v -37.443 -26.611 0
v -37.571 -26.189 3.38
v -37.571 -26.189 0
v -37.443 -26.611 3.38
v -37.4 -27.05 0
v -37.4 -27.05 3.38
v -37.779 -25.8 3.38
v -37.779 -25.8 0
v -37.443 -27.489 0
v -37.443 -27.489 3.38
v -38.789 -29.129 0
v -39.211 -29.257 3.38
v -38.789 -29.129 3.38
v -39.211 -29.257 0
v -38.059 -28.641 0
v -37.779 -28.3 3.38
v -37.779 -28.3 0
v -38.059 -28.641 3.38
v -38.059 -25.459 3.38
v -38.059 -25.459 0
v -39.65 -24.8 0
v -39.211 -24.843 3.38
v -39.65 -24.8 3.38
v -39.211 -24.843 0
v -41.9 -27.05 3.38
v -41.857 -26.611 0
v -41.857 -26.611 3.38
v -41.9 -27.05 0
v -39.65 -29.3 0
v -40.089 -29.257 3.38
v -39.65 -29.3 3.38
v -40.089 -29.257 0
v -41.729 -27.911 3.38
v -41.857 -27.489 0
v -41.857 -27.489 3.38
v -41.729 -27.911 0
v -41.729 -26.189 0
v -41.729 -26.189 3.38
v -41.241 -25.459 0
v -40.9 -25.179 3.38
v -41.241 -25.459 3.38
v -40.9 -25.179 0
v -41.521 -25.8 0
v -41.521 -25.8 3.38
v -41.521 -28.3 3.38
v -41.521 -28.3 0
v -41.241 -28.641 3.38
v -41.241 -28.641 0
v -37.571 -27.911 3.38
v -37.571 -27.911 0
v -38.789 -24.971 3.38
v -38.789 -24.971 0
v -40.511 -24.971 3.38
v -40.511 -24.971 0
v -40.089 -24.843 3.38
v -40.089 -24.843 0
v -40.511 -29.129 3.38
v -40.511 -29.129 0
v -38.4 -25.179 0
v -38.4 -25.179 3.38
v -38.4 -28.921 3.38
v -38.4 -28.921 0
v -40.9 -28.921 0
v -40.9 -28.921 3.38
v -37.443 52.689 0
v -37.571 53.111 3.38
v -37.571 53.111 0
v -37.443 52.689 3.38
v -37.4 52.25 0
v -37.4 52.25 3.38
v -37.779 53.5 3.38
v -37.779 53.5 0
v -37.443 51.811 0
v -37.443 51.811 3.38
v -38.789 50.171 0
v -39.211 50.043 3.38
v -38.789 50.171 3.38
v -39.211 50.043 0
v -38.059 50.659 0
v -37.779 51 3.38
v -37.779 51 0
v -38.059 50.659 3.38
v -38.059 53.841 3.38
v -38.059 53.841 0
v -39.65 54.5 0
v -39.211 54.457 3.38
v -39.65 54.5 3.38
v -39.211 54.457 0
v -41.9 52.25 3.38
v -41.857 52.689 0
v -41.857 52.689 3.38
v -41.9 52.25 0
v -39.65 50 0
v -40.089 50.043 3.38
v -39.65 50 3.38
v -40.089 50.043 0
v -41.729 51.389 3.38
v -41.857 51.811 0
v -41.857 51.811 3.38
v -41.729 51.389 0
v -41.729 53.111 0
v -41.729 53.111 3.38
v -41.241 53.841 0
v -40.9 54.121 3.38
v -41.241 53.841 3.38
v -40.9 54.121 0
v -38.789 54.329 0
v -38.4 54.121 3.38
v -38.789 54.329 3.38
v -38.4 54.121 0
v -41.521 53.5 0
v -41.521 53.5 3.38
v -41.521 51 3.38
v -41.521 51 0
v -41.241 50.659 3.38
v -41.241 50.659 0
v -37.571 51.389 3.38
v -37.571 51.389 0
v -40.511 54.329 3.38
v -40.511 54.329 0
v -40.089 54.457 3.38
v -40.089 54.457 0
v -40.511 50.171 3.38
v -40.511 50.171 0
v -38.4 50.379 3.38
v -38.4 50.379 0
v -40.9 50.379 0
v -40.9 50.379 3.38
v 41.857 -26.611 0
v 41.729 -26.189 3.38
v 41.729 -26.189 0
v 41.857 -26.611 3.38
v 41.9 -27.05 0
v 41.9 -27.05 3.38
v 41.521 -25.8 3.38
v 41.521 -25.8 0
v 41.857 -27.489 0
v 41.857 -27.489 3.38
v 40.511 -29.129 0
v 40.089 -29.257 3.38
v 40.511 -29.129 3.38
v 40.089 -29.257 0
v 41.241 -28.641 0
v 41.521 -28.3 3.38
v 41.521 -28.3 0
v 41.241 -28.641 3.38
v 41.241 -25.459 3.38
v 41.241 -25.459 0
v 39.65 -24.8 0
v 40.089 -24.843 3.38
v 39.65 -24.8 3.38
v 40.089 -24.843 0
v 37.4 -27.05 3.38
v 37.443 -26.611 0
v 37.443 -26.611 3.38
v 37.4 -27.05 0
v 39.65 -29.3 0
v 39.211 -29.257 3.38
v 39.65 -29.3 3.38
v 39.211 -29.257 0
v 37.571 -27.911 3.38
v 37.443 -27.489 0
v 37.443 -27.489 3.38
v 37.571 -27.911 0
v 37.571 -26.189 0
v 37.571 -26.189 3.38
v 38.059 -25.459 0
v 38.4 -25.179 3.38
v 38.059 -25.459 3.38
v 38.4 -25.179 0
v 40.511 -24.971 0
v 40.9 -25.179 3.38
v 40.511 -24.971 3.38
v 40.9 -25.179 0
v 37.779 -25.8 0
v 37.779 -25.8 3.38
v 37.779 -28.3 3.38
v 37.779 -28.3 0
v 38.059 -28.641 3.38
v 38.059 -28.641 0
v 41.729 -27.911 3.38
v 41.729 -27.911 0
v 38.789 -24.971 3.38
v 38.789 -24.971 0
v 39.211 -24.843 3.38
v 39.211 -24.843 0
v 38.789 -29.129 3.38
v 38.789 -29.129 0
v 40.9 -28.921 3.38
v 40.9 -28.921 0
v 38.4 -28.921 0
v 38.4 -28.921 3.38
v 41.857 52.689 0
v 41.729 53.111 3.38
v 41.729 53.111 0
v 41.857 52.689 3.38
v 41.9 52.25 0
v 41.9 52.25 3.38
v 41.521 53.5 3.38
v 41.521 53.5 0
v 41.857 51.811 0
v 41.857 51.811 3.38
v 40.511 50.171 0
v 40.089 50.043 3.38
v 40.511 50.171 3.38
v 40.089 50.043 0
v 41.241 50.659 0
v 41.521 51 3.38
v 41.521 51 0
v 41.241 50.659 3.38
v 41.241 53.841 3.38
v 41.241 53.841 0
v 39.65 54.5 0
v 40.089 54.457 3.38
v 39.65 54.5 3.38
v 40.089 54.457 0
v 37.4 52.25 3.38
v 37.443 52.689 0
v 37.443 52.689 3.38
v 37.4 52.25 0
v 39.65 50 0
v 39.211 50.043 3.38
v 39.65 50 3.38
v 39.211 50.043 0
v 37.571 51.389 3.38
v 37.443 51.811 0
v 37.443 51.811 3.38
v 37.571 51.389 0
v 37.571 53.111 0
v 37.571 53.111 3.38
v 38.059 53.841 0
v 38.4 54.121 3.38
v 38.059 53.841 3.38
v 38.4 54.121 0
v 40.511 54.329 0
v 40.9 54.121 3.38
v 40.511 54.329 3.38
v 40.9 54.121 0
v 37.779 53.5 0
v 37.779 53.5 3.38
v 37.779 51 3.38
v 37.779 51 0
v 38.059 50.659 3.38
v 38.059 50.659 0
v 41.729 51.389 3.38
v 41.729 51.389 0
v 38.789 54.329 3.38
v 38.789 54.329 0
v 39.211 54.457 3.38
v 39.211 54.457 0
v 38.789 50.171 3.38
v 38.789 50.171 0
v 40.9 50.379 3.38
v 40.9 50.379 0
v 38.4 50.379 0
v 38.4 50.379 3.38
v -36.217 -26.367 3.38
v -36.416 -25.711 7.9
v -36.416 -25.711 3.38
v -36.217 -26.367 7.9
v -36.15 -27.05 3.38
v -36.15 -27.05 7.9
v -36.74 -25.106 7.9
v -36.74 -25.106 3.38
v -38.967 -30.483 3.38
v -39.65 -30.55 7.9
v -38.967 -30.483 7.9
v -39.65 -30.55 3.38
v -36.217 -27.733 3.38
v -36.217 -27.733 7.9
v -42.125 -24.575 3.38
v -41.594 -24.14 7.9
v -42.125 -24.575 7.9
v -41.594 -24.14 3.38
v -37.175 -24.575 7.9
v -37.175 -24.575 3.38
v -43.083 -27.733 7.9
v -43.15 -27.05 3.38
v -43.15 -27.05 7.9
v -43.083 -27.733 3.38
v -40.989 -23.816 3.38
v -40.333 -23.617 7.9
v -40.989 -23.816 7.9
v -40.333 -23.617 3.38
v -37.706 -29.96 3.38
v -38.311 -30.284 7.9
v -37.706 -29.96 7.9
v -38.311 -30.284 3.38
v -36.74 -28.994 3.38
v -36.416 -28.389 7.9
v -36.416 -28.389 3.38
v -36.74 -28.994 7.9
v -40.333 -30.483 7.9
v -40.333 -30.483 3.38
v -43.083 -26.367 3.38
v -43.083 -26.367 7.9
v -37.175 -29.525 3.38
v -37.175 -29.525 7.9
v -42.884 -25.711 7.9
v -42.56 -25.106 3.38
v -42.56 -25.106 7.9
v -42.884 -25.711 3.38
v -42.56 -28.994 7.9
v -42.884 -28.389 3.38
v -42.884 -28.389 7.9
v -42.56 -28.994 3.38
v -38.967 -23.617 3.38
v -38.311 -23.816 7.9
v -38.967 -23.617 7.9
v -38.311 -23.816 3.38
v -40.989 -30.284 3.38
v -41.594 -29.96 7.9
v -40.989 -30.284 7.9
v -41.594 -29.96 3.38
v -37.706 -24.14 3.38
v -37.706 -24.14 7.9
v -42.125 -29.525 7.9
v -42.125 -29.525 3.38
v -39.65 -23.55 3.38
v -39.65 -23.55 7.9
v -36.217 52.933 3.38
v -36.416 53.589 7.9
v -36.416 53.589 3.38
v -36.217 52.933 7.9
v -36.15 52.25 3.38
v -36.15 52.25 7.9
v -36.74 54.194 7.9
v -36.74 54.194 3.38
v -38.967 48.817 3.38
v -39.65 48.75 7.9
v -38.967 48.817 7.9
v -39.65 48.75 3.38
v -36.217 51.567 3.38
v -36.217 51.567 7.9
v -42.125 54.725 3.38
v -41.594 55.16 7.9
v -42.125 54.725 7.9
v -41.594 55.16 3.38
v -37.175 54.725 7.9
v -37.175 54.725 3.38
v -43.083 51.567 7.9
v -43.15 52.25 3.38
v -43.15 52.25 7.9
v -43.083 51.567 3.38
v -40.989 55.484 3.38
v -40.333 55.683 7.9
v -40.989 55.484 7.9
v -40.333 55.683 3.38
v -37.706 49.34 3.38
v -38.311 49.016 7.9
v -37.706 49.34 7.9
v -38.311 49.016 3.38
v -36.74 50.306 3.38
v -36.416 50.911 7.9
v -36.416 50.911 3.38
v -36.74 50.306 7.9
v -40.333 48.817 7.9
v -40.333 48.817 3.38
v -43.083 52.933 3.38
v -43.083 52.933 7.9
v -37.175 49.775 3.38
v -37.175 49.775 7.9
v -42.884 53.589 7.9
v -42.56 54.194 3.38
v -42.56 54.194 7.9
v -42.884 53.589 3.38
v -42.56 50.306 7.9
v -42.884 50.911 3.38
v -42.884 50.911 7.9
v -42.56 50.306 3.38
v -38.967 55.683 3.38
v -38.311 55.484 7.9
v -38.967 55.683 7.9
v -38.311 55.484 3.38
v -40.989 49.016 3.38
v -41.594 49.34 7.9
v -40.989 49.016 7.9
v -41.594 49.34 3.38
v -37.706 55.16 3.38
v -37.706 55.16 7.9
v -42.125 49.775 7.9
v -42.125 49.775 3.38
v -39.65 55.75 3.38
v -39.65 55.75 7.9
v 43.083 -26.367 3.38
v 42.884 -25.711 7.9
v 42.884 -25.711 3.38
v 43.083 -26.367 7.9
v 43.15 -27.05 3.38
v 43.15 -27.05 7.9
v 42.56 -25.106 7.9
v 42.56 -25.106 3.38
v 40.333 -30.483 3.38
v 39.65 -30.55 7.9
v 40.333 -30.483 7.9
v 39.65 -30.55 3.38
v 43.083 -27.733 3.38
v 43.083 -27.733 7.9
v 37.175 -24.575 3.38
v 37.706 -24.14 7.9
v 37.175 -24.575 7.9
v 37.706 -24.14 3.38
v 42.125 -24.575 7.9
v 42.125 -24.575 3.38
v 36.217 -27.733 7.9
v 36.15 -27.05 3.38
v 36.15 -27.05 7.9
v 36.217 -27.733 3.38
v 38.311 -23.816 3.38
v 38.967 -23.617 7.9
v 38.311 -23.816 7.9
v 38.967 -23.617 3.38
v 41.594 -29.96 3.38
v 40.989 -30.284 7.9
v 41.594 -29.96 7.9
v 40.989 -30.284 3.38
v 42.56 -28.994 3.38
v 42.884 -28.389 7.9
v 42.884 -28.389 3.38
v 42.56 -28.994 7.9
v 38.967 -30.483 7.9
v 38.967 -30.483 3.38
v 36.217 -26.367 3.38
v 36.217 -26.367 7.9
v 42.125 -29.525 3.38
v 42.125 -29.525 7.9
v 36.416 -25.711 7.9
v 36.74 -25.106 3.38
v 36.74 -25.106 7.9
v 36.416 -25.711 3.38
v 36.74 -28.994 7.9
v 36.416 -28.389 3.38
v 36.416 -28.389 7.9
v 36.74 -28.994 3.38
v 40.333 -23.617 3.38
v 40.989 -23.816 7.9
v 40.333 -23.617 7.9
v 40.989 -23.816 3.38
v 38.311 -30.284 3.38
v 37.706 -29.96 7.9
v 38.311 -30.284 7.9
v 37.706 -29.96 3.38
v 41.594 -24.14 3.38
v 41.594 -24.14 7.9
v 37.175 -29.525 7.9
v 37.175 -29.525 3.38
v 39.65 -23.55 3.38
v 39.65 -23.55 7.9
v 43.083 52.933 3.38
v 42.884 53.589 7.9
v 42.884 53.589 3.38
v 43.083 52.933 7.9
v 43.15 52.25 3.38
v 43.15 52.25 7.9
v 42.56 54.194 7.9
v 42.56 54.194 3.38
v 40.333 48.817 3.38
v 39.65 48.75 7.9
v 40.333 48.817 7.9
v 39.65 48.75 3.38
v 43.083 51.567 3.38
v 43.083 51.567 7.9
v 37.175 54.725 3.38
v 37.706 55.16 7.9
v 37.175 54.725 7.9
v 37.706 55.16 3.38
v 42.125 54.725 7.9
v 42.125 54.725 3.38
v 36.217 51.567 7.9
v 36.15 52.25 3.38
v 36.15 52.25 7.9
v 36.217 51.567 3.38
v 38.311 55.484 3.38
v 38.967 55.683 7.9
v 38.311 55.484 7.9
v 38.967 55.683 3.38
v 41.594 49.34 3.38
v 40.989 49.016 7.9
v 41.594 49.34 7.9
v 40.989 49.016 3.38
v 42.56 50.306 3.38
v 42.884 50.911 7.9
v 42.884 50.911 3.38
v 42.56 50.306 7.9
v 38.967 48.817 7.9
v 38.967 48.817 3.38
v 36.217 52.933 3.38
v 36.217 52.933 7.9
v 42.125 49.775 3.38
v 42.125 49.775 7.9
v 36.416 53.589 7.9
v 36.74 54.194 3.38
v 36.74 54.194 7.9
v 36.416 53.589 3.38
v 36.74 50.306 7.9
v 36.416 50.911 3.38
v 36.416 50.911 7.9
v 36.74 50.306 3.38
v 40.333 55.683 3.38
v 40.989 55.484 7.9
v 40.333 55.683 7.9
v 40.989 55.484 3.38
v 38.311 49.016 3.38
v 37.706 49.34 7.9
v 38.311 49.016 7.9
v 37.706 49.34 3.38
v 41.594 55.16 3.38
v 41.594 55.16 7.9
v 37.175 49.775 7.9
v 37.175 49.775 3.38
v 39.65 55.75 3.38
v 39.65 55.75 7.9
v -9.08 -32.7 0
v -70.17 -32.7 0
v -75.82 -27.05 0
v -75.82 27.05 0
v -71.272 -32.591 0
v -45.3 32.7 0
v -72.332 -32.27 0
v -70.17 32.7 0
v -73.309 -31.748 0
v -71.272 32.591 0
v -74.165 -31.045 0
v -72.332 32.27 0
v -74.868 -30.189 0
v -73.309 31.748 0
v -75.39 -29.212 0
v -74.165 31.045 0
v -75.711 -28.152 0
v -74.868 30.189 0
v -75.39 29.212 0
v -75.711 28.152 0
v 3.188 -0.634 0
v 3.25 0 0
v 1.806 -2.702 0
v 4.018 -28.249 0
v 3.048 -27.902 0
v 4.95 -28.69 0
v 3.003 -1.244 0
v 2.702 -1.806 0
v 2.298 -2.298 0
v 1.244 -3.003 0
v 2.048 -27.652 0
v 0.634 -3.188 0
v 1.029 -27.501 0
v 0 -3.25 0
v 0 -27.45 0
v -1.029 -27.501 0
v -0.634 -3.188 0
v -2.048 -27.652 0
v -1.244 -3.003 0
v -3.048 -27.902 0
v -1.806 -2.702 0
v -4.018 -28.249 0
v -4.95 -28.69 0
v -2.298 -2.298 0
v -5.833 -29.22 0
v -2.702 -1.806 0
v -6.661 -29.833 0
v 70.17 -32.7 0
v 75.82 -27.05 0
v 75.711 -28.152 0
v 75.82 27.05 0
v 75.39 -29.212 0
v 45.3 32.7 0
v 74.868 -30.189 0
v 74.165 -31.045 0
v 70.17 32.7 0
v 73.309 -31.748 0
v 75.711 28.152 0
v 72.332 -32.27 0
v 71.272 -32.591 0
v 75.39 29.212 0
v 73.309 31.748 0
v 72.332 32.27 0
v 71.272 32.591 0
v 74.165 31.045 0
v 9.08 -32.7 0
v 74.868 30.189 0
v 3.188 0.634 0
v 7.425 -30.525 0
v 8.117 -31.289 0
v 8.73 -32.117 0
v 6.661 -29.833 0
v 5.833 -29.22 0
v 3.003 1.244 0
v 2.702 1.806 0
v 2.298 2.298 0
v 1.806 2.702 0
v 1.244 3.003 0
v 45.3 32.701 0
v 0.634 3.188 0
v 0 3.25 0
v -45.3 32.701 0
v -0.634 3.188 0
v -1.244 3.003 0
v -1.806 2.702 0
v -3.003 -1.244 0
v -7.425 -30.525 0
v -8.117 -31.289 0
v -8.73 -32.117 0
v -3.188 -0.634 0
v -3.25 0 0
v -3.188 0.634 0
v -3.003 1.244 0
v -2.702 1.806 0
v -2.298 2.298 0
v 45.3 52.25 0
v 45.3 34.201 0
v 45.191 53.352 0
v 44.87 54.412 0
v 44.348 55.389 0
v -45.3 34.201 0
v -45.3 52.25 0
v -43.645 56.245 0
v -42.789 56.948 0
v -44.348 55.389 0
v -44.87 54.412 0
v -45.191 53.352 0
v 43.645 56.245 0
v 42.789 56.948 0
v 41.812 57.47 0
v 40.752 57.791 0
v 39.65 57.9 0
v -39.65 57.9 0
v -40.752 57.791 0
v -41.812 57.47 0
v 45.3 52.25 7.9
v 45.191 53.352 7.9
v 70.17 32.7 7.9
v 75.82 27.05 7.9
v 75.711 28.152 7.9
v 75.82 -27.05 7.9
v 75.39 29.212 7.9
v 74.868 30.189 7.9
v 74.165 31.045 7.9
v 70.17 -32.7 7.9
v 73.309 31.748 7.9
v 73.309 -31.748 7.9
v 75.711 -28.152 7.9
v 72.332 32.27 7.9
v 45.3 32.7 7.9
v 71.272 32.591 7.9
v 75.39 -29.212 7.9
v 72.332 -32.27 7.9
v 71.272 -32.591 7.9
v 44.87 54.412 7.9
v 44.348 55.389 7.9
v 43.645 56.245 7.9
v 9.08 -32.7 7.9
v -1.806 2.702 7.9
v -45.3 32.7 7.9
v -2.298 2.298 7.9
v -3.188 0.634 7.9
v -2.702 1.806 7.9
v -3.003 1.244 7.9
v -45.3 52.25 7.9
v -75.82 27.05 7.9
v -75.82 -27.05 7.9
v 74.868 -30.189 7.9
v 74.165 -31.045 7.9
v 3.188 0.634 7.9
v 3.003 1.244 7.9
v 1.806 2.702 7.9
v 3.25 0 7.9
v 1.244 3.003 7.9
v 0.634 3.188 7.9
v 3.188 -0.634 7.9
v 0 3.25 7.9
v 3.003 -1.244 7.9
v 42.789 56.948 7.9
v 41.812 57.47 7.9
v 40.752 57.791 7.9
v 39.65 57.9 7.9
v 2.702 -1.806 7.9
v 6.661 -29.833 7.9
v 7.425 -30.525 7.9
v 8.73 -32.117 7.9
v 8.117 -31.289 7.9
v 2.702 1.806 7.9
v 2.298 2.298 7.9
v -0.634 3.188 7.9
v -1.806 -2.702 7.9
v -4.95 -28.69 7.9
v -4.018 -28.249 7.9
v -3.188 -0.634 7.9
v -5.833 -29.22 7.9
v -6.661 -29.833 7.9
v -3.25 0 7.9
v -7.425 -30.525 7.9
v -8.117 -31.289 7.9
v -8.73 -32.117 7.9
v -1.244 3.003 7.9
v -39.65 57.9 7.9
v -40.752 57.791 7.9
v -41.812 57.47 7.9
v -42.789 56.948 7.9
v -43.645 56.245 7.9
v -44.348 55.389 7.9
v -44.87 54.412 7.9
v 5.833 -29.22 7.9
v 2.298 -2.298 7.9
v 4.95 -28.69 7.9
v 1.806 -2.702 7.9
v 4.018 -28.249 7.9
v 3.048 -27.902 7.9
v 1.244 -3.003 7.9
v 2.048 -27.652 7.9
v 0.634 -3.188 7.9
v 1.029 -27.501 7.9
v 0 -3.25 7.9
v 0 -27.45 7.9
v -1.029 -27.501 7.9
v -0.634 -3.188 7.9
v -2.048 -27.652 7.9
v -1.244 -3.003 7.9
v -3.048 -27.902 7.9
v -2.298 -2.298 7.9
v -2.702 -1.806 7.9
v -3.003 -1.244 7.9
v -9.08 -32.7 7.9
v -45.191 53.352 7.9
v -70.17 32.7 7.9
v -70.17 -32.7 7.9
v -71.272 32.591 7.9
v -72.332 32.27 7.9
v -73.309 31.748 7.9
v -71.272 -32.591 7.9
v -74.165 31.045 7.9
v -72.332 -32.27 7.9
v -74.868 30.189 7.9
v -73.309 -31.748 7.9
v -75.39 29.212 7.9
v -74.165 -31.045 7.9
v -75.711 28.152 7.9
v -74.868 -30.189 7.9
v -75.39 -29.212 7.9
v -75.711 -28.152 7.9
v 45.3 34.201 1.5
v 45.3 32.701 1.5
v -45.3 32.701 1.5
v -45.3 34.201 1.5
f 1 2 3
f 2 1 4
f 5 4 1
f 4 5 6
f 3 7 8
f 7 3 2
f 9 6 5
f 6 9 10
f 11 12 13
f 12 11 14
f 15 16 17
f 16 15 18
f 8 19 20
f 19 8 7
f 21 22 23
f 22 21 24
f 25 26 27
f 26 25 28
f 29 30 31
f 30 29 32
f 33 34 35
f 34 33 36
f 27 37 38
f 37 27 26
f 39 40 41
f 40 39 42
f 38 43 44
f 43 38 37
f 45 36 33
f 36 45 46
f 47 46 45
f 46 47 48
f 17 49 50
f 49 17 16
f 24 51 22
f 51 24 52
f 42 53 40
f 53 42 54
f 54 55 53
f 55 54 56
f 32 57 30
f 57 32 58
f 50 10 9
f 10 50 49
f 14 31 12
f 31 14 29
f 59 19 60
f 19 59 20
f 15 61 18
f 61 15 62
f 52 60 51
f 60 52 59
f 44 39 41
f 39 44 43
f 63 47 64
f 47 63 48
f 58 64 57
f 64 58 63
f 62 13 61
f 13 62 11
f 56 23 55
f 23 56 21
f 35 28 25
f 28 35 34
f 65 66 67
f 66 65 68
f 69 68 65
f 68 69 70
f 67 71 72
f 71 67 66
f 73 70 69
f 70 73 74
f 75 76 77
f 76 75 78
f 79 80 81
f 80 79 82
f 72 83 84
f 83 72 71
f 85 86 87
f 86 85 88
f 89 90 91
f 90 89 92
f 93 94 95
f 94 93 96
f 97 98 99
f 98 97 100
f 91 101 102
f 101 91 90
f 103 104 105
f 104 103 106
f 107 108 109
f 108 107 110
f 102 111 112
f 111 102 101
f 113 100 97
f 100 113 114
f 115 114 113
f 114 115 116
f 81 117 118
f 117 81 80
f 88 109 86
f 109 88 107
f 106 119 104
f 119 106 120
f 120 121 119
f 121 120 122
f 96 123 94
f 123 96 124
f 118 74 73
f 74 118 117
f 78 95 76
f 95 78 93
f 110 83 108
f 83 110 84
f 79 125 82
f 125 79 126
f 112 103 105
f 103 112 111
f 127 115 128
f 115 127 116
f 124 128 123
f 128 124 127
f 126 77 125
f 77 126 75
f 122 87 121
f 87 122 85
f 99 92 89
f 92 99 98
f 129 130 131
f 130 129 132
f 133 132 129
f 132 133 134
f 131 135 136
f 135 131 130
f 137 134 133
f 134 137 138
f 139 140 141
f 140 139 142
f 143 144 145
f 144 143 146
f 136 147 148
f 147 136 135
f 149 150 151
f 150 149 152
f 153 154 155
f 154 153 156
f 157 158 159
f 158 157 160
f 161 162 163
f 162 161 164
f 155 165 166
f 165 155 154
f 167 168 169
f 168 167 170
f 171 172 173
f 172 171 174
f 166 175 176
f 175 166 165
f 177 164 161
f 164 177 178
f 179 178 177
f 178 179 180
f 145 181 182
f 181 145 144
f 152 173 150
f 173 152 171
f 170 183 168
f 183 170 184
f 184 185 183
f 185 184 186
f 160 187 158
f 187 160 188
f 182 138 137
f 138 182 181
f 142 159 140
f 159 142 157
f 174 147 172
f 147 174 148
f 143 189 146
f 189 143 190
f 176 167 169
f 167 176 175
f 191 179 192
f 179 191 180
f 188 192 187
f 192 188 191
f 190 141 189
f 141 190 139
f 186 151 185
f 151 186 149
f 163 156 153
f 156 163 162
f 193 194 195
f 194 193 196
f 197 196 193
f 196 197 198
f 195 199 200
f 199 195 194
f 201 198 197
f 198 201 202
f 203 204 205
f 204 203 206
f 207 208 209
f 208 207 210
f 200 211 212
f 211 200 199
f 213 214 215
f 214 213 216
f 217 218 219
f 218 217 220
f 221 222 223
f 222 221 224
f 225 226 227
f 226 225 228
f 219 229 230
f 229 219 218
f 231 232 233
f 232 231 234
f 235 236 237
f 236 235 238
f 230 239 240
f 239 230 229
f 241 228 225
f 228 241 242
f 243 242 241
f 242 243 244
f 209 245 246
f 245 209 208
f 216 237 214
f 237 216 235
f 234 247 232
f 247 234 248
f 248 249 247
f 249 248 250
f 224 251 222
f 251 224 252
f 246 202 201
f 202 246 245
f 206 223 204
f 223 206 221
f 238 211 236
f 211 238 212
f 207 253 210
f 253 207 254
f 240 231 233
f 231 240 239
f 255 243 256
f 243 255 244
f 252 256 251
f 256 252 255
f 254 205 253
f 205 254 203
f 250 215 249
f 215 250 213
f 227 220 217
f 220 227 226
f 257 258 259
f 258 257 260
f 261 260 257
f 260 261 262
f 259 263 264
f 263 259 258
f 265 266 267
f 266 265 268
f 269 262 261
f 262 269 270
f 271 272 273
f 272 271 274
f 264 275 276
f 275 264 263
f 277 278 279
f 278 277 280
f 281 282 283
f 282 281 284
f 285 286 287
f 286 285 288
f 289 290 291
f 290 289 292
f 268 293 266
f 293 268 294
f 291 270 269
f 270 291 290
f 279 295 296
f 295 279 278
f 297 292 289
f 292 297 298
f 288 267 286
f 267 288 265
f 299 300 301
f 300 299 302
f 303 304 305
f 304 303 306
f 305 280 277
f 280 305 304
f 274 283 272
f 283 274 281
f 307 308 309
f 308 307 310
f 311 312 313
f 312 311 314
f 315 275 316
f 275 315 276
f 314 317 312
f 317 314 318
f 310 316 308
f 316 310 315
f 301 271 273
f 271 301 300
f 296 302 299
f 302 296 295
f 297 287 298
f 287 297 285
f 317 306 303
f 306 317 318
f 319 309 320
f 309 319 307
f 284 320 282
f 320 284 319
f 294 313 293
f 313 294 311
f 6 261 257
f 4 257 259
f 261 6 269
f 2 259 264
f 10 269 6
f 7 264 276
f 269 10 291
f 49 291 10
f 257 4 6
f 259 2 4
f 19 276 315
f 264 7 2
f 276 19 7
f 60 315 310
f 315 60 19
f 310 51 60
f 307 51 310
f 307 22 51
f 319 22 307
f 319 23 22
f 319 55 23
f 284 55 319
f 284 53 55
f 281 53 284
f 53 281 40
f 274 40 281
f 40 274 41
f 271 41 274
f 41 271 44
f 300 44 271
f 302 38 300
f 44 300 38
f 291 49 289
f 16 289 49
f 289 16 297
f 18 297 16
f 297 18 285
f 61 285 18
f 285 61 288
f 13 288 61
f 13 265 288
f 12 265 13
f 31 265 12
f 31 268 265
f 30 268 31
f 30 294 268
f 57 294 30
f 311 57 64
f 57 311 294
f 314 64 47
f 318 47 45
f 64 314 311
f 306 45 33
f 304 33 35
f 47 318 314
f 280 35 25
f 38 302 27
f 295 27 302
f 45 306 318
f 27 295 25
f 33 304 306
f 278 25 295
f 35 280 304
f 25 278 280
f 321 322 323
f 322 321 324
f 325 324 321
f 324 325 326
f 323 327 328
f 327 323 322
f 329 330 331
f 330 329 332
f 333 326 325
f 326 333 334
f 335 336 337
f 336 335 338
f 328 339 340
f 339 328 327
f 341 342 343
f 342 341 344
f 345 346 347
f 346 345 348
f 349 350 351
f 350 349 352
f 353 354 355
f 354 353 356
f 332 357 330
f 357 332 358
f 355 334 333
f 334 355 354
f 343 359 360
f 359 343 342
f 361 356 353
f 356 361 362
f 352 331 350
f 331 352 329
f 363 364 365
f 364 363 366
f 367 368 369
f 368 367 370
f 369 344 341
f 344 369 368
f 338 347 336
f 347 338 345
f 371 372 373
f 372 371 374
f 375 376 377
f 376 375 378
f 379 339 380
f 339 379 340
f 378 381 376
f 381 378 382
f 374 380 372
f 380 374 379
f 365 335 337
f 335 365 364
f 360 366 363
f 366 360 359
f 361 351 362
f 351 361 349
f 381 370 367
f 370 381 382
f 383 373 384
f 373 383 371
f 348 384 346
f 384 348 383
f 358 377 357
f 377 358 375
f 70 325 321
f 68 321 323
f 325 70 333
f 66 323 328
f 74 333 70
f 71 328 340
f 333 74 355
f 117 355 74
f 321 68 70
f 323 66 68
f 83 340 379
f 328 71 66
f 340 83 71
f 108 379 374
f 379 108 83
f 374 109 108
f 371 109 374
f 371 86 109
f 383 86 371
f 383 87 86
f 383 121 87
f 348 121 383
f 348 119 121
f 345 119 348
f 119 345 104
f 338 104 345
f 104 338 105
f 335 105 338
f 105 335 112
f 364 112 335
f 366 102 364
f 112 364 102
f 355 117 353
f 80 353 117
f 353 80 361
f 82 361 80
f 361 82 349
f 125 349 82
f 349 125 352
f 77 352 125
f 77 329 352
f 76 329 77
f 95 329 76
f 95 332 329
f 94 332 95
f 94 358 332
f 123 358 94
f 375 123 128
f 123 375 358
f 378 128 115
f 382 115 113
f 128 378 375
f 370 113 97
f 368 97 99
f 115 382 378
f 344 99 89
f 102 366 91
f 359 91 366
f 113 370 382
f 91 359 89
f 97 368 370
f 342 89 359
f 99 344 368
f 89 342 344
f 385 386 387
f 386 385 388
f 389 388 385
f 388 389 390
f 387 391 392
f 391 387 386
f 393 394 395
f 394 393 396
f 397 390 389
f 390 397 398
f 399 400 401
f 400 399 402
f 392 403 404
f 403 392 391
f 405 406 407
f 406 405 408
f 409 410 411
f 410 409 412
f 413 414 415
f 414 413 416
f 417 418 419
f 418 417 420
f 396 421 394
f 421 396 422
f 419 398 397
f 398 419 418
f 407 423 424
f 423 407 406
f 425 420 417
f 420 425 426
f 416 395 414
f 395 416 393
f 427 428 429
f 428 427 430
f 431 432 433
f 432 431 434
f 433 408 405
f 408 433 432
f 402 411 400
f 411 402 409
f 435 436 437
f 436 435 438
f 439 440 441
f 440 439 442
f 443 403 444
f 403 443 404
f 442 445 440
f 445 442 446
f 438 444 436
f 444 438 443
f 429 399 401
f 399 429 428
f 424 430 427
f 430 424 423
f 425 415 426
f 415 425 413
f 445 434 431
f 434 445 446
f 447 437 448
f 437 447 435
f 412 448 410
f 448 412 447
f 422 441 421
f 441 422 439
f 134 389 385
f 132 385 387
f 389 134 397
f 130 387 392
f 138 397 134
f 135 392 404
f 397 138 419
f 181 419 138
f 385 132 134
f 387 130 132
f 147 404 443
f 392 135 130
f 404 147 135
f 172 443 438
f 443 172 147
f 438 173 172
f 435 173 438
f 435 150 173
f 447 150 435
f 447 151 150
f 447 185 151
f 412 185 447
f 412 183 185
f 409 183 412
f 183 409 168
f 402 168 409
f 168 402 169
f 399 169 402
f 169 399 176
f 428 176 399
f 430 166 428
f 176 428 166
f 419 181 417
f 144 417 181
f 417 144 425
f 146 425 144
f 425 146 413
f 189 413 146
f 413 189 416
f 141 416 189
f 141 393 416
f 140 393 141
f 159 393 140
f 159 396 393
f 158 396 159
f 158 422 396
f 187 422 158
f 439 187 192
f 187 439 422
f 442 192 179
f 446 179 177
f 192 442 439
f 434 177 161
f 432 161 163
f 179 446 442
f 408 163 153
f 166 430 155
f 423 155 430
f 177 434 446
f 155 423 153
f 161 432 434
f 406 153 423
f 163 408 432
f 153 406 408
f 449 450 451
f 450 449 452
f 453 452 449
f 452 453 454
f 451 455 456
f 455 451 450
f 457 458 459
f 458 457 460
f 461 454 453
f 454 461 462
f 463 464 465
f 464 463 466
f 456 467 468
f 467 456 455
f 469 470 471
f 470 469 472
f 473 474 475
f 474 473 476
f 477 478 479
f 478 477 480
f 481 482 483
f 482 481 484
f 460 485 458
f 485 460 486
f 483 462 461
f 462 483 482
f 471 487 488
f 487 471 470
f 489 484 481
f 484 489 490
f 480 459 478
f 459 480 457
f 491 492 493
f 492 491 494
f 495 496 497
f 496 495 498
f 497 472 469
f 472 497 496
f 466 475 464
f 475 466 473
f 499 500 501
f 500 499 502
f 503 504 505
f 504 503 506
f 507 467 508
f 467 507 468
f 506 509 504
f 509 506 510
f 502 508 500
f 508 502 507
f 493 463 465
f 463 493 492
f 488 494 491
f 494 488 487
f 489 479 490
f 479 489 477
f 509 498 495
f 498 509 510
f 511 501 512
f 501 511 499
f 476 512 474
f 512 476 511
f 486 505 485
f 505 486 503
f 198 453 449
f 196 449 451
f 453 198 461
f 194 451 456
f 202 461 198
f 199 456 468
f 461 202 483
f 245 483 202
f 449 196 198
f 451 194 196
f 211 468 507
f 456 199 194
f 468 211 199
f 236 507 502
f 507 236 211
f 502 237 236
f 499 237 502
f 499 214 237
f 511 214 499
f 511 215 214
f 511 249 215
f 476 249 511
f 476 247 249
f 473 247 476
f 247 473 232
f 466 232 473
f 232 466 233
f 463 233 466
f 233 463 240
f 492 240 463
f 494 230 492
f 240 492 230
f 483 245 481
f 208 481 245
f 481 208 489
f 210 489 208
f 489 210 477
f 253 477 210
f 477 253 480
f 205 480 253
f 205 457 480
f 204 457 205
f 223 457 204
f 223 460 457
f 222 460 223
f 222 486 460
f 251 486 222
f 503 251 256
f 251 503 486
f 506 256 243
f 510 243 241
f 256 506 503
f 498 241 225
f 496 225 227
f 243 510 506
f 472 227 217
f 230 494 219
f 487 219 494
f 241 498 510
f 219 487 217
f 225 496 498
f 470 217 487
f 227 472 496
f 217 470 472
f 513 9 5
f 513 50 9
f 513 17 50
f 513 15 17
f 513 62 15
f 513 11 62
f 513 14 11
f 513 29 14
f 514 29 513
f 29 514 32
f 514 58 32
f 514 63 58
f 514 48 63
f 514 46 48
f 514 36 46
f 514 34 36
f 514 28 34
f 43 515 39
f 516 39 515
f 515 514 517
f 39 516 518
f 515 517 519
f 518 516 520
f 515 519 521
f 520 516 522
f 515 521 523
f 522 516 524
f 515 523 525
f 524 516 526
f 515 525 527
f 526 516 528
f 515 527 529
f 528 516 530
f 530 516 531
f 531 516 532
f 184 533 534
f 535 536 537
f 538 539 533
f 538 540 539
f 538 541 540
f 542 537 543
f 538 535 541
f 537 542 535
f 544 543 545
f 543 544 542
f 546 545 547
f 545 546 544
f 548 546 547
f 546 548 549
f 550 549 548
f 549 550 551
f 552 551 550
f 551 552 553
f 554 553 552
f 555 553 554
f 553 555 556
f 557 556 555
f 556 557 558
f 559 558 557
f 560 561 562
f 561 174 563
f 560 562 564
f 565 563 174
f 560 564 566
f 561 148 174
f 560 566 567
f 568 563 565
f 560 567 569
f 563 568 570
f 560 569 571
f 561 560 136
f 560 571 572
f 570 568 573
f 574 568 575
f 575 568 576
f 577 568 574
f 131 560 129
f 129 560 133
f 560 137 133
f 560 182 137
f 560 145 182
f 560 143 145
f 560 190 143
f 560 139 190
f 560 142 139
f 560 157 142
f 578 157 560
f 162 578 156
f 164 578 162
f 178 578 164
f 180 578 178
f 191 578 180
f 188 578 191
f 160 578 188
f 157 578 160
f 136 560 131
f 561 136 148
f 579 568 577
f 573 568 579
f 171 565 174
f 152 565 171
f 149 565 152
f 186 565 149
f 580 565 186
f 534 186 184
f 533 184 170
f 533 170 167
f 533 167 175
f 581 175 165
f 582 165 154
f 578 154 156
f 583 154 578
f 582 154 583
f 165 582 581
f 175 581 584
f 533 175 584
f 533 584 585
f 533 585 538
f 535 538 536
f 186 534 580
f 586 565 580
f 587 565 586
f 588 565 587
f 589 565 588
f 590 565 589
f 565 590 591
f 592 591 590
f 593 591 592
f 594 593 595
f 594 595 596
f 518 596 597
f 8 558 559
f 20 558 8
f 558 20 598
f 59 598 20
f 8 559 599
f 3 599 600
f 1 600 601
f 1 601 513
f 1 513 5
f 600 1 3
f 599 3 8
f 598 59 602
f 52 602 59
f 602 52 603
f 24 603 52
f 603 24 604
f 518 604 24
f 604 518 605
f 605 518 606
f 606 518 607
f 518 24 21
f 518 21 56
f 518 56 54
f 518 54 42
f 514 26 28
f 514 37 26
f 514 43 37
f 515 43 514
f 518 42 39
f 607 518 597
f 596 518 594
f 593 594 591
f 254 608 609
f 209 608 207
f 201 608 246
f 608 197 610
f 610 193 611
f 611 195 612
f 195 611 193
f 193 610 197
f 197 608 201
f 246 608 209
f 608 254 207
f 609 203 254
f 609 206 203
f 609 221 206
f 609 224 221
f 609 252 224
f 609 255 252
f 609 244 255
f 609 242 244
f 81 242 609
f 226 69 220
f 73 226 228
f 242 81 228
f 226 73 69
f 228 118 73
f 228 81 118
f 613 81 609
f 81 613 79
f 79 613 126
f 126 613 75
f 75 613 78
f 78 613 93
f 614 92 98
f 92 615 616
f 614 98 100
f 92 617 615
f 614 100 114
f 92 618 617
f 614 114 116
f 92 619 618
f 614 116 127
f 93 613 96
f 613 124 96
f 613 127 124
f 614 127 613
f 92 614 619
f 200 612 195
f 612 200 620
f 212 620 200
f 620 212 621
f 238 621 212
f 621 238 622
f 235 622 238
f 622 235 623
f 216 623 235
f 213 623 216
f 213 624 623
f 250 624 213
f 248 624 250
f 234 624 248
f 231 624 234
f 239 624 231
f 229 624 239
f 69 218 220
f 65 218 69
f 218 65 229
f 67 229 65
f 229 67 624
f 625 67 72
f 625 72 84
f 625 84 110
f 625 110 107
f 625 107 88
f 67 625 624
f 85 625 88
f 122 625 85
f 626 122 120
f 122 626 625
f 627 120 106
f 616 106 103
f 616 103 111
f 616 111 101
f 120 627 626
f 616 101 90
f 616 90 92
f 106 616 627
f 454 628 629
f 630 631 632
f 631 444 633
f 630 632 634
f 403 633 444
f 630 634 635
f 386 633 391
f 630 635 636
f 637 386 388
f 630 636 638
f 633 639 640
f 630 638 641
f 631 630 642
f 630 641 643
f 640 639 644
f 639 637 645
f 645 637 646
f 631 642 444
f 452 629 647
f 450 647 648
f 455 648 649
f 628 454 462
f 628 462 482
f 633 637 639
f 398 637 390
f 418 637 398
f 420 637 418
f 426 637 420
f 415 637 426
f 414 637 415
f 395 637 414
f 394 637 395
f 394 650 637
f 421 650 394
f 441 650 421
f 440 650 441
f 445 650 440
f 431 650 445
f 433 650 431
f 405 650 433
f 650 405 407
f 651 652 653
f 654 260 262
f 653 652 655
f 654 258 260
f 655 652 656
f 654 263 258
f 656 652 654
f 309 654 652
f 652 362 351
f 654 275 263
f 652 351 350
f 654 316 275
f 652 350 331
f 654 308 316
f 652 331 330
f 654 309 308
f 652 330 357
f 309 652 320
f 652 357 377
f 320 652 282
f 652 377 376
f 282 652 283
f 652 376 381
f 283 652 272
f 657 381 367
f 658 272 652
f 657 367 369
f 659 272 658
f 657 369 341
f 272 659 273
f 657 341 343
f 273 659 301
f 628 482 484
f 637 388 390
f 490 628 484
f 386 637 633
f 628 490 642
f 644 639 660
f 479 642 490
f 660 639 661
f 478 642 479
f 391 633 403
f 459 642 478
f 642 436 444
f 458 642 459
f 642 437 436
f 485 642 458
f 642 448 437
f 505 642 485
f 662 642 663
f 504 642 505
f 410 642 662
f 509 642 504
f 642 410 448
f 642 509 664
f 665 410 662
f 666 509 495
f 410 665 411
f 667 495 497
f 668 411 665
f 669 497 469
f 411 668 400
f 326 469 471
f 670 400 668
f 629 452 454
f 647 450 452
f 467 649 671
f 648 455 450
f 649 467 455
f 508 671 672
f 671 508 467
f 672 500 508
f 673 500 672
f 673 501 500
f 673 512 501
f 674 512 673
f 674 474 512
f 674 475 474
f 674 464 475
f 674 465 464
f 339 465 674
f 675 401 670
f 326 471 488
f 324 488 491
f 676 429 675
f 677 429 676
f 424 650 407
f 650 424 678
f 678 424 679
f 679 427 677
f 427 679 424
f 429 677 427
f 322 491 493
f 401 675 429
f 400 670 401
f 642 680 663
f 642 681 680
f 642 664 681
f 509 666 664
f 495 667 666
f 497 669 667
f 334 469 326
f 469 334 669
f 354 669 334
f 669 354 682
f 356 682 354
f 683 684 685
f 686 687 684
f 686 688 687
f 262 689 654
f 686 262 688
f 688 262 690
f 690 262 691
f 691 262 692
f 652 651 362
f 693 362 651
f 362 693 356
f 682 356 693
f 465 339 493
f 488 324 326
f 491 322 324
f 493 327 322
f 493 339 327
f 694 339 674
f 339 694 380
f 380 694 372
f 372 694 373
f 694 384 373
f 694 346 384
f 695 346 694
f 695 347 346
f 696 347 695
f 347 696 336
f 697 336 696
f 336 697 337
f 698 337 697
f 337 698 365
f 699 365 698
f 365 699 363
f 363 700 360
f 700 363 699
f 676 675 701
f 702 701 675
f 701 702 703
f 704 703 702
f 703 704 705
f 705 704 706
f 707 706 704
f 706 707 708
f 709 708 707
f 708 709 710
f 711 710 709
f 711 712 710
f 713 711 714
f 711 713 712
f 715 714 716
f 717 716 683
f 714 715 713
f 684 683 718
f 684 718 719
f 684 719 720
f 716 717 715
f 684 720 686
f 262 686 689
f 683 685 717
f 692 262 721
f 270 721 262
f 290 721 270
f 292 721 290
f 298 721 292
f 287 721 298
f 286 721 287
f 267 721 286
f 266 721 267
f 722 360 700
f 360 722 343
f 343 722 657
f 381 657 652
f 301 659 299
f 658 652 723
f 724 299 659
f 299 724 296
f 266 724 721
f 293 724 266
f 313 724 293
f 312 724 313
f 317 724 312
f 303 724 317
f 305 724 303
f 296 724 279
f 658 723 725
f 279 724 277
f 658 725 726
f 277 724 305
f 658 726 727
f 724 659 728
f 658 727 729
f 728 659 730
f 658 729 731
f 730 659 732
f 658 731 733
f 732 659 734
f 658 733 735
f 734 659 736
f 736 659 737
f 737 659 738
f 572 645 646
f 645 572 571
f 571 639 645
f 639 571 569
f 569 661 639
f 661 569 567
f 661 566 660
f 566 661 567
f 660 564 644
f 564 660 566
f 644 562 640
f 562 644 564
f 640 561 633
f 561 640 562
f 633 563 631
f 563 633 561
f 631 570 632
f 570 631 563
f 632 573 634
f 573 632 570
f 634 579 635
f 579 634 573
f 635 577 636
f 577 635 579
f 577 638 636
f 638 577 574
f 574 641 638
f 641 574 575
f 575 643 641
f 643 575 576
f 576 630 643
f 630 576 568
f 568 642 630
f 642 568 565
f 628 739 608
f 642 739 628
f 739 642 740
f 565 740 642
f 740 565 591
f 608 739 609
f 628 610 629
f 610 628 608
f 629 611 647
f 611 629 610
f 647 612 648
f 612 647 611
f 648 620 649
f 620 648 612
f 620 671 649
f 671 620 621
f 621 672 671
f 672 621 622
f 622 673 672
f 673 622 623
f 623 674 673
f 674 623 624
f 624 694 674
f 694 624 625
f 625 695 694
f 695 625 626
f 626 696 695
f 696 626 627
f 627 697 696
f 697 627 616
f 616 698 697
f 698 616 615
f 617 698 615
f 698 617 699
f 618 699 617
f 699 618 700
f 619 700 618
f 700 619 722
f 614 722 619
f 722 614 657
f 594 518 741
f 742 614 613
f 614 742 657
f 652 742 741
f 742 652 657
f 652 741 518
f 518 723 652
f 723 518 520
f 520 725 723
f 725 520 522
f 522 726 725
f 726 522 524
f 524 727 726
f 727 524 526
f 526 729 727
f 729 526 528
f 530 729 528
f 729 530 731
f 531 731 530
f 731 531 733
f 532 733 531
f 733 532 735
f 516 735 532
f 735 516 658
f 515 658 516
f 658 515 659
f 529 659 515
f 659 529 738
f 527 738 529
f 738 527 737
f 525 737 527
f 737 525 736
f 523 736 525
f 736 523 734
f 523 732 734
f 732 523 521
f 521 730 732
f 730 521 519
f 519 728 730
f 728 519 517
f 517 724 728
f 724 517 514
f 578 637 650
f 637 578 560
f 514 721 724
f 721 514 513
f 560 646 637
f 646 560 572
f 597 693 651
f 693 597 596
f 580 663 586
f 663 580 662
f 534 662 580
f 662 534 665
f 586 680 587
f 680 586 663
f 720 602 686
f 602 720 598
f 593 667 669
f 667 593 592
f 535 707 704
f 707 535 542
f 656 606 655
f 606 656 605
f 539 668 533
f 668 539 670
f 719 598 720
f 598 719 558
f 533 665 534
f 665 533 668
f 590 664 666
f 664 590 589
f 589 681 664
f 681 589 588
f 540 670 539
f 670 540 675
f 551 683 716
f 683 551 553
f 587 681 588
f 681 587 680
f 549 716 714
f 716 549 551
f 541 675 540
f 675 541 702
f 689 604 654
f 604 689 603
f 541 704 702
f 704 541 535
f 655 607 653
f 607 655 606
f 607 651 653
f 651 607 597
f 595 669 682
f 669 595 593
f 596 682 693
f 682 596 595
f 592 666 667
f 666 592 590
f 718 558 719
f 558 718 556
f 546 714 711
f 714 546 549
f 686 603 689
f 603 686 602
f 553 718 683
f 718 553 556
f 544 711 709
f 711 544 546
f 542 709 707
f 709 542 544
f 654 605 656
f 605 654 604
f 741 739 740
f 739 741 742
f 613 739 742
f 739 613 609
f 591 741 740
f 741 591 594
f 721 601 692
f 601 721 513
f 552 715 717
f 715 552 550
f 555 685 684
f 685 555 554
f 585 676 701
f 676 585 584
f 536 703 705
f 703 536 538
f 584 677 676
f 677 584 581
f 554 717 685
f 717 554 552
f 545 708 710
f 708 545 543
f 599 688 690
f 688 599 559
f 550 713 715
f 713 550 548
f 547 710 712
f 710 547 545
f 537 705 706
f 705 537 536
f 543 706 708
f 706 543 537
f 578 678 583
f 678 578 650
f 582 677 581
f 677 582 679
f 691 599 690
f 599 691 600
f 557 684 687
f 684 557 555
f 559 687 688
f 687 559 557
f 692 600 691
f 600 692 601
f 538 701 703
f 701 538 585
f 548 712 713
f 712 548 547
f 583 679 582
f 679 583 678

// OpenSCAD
// file: ../shapes.scad
// The xy_ variants of shape modules are centered with respect to the X/Y axes and "sit" on te XY plane.

$fn=32;

module xy_cube(width, depth, height) {
    translate([0, 0, height / 2])
    cube([width, depth, height], center=true);
}

module xy_cylinder(
    h,
    r, r1, r2,
    d, d1, d2)
{
    translate([0, 0, h / 2])
    cylinder(h=h, r=r, r1=r1, r2=r2, d=d, d1=d1, d2=d2, center=true);
}

module rounded_square(width, length, radius) {
    diameter = radius * 2;
    
    minkowski() {
        square([width - diameter, length - diameter], center=true);
        circle(radius);
    }
}

// Spreads out its children, spacing them along the x/y/z axis by the given amount.
module spread(x, y, z) {
    for(i = [0 : $children -1 ]) {
        translate([i*x, i*y, i*z])
        children(i);
    }
}

spread(15, 0, 0) {
    xy_cube(10, 10, 10);
    xy_cylinder(10, d=10);
    rounded_square(5, 10, 1);
}
// file: sentinel.scad
// The designs in this folder are meant to be mounted on a side panel using the "battery panel mount" that is
// included in the official AAT STLs
// https://github.com/aat-sentinel/AAT-lite-hardware/tree/main/Extras/AAT%20battery%20panel%20mount

// Dimensions of the blocks on a side panel of the Sentinel AAT
panel_block_width = 16;
panel_block_length = 30;
panel_block_separation = 32;

// M3 phillips flat head screw dimensions, included in the Sentinel kit.
panel_screwhead_diameter = 6;
panel_screw_diameter = 2;

module panel_mounting_holes(height) {
    // There are 3 screw holes, evenly spaced, in a single column centered on the blocks.
    x_offset = panel_block_length / 4;
    y_offset = (panel_block_separation / 2) + panel_block_width / 2;
    
    for(x = [-1, 0, 1]) {
        for(y = [-1, 1]) {
            translate([x * x_offset, y * y_offset, -epsilon])
            xy_cylinder(
                h = height + (2 * epsilon),
                d1 = panel_screw_diameter,
                d2 = panel_screwhead_diameter
            );
        }
    }
}
// file: ../globals.scad
$fn = 64;

// The tolerance of your 3d printer that results in a "tight fit" of two parts.
tolerance = 0.1;

// A small value to be used to offset unions and differences to avoid "z-fighting"
epsilon = 0.001;
// main file
include <../globals.scad>
include <./sentinel.scad>

use <../shapes.scad>

m4_diameter = 4.5;
m4_head_diameter = 7;
m4_head_depth = 4.5;

thickness = 3.4;
screw_diameter = 6.5;
radius = 5.65;

antenna_width = 151.64;
antenna_mount_height = 65.4;
antenna_ridge_height = 3;
antenna_ridge_width = 1.5;

wire_screw_cutout_radius = 21/2;

tracker_mount_width = 90.6;

mount_offset = (tracker_mount_width - antenna_mount_height) / 2;

total_thickness = thickness + m4_head_depth;

module tracker_mount_holes(diameter, height) {   
    hole_offset = tracker_mount_width / 2 - radius;
    
    // Mounting plate holes
    for(x = [-1, 1]) {
        for(y = [-1, 1]) {
            translate([x * hole_offset, y * hole_offset, 0])
            xy_cylinder(d = diameter, h = height);
        }
    }
   
}

module mount_plate() {
    linear_extrude(total_thickness)
    union() {
        rounded_square(antenna_width, antenna_mount_height, radius);        
        
        translate([0, mount_offset, 0])
        rounded_square(tracker_mount_width, tracker_mount_width, radius);
    }
}
    

module mount() {
    difference() {
        mount_plate();
        
        translate([0, 0, -10 * epsilon])
        xy_cylinder(d = screw_diameter, h = 100);
        
        translate([0, mount_offset, -10 * epsilon])
        tracker_mount_holes(m4_diameter, thickness);
        
        translate([0, mount_offset, thickness + (-20 * epsilon)])
        tracker_mount_holes(m4_head_diameter, 100);
        
        translate([0, (antenna_mount_height/2 + antenna_ridge_width/2) + epsilon, 0])
        cube([1000, antenna_ridge_width, antenna_ridge_height], center = true);
        
        translate([0, -antenna_mount_height/2 - wire_screw_cutout_radius/2, -10])
        linear_extrude(150)
        circle(r = wire_screw_cutout_radius);
    }
}

mount();
